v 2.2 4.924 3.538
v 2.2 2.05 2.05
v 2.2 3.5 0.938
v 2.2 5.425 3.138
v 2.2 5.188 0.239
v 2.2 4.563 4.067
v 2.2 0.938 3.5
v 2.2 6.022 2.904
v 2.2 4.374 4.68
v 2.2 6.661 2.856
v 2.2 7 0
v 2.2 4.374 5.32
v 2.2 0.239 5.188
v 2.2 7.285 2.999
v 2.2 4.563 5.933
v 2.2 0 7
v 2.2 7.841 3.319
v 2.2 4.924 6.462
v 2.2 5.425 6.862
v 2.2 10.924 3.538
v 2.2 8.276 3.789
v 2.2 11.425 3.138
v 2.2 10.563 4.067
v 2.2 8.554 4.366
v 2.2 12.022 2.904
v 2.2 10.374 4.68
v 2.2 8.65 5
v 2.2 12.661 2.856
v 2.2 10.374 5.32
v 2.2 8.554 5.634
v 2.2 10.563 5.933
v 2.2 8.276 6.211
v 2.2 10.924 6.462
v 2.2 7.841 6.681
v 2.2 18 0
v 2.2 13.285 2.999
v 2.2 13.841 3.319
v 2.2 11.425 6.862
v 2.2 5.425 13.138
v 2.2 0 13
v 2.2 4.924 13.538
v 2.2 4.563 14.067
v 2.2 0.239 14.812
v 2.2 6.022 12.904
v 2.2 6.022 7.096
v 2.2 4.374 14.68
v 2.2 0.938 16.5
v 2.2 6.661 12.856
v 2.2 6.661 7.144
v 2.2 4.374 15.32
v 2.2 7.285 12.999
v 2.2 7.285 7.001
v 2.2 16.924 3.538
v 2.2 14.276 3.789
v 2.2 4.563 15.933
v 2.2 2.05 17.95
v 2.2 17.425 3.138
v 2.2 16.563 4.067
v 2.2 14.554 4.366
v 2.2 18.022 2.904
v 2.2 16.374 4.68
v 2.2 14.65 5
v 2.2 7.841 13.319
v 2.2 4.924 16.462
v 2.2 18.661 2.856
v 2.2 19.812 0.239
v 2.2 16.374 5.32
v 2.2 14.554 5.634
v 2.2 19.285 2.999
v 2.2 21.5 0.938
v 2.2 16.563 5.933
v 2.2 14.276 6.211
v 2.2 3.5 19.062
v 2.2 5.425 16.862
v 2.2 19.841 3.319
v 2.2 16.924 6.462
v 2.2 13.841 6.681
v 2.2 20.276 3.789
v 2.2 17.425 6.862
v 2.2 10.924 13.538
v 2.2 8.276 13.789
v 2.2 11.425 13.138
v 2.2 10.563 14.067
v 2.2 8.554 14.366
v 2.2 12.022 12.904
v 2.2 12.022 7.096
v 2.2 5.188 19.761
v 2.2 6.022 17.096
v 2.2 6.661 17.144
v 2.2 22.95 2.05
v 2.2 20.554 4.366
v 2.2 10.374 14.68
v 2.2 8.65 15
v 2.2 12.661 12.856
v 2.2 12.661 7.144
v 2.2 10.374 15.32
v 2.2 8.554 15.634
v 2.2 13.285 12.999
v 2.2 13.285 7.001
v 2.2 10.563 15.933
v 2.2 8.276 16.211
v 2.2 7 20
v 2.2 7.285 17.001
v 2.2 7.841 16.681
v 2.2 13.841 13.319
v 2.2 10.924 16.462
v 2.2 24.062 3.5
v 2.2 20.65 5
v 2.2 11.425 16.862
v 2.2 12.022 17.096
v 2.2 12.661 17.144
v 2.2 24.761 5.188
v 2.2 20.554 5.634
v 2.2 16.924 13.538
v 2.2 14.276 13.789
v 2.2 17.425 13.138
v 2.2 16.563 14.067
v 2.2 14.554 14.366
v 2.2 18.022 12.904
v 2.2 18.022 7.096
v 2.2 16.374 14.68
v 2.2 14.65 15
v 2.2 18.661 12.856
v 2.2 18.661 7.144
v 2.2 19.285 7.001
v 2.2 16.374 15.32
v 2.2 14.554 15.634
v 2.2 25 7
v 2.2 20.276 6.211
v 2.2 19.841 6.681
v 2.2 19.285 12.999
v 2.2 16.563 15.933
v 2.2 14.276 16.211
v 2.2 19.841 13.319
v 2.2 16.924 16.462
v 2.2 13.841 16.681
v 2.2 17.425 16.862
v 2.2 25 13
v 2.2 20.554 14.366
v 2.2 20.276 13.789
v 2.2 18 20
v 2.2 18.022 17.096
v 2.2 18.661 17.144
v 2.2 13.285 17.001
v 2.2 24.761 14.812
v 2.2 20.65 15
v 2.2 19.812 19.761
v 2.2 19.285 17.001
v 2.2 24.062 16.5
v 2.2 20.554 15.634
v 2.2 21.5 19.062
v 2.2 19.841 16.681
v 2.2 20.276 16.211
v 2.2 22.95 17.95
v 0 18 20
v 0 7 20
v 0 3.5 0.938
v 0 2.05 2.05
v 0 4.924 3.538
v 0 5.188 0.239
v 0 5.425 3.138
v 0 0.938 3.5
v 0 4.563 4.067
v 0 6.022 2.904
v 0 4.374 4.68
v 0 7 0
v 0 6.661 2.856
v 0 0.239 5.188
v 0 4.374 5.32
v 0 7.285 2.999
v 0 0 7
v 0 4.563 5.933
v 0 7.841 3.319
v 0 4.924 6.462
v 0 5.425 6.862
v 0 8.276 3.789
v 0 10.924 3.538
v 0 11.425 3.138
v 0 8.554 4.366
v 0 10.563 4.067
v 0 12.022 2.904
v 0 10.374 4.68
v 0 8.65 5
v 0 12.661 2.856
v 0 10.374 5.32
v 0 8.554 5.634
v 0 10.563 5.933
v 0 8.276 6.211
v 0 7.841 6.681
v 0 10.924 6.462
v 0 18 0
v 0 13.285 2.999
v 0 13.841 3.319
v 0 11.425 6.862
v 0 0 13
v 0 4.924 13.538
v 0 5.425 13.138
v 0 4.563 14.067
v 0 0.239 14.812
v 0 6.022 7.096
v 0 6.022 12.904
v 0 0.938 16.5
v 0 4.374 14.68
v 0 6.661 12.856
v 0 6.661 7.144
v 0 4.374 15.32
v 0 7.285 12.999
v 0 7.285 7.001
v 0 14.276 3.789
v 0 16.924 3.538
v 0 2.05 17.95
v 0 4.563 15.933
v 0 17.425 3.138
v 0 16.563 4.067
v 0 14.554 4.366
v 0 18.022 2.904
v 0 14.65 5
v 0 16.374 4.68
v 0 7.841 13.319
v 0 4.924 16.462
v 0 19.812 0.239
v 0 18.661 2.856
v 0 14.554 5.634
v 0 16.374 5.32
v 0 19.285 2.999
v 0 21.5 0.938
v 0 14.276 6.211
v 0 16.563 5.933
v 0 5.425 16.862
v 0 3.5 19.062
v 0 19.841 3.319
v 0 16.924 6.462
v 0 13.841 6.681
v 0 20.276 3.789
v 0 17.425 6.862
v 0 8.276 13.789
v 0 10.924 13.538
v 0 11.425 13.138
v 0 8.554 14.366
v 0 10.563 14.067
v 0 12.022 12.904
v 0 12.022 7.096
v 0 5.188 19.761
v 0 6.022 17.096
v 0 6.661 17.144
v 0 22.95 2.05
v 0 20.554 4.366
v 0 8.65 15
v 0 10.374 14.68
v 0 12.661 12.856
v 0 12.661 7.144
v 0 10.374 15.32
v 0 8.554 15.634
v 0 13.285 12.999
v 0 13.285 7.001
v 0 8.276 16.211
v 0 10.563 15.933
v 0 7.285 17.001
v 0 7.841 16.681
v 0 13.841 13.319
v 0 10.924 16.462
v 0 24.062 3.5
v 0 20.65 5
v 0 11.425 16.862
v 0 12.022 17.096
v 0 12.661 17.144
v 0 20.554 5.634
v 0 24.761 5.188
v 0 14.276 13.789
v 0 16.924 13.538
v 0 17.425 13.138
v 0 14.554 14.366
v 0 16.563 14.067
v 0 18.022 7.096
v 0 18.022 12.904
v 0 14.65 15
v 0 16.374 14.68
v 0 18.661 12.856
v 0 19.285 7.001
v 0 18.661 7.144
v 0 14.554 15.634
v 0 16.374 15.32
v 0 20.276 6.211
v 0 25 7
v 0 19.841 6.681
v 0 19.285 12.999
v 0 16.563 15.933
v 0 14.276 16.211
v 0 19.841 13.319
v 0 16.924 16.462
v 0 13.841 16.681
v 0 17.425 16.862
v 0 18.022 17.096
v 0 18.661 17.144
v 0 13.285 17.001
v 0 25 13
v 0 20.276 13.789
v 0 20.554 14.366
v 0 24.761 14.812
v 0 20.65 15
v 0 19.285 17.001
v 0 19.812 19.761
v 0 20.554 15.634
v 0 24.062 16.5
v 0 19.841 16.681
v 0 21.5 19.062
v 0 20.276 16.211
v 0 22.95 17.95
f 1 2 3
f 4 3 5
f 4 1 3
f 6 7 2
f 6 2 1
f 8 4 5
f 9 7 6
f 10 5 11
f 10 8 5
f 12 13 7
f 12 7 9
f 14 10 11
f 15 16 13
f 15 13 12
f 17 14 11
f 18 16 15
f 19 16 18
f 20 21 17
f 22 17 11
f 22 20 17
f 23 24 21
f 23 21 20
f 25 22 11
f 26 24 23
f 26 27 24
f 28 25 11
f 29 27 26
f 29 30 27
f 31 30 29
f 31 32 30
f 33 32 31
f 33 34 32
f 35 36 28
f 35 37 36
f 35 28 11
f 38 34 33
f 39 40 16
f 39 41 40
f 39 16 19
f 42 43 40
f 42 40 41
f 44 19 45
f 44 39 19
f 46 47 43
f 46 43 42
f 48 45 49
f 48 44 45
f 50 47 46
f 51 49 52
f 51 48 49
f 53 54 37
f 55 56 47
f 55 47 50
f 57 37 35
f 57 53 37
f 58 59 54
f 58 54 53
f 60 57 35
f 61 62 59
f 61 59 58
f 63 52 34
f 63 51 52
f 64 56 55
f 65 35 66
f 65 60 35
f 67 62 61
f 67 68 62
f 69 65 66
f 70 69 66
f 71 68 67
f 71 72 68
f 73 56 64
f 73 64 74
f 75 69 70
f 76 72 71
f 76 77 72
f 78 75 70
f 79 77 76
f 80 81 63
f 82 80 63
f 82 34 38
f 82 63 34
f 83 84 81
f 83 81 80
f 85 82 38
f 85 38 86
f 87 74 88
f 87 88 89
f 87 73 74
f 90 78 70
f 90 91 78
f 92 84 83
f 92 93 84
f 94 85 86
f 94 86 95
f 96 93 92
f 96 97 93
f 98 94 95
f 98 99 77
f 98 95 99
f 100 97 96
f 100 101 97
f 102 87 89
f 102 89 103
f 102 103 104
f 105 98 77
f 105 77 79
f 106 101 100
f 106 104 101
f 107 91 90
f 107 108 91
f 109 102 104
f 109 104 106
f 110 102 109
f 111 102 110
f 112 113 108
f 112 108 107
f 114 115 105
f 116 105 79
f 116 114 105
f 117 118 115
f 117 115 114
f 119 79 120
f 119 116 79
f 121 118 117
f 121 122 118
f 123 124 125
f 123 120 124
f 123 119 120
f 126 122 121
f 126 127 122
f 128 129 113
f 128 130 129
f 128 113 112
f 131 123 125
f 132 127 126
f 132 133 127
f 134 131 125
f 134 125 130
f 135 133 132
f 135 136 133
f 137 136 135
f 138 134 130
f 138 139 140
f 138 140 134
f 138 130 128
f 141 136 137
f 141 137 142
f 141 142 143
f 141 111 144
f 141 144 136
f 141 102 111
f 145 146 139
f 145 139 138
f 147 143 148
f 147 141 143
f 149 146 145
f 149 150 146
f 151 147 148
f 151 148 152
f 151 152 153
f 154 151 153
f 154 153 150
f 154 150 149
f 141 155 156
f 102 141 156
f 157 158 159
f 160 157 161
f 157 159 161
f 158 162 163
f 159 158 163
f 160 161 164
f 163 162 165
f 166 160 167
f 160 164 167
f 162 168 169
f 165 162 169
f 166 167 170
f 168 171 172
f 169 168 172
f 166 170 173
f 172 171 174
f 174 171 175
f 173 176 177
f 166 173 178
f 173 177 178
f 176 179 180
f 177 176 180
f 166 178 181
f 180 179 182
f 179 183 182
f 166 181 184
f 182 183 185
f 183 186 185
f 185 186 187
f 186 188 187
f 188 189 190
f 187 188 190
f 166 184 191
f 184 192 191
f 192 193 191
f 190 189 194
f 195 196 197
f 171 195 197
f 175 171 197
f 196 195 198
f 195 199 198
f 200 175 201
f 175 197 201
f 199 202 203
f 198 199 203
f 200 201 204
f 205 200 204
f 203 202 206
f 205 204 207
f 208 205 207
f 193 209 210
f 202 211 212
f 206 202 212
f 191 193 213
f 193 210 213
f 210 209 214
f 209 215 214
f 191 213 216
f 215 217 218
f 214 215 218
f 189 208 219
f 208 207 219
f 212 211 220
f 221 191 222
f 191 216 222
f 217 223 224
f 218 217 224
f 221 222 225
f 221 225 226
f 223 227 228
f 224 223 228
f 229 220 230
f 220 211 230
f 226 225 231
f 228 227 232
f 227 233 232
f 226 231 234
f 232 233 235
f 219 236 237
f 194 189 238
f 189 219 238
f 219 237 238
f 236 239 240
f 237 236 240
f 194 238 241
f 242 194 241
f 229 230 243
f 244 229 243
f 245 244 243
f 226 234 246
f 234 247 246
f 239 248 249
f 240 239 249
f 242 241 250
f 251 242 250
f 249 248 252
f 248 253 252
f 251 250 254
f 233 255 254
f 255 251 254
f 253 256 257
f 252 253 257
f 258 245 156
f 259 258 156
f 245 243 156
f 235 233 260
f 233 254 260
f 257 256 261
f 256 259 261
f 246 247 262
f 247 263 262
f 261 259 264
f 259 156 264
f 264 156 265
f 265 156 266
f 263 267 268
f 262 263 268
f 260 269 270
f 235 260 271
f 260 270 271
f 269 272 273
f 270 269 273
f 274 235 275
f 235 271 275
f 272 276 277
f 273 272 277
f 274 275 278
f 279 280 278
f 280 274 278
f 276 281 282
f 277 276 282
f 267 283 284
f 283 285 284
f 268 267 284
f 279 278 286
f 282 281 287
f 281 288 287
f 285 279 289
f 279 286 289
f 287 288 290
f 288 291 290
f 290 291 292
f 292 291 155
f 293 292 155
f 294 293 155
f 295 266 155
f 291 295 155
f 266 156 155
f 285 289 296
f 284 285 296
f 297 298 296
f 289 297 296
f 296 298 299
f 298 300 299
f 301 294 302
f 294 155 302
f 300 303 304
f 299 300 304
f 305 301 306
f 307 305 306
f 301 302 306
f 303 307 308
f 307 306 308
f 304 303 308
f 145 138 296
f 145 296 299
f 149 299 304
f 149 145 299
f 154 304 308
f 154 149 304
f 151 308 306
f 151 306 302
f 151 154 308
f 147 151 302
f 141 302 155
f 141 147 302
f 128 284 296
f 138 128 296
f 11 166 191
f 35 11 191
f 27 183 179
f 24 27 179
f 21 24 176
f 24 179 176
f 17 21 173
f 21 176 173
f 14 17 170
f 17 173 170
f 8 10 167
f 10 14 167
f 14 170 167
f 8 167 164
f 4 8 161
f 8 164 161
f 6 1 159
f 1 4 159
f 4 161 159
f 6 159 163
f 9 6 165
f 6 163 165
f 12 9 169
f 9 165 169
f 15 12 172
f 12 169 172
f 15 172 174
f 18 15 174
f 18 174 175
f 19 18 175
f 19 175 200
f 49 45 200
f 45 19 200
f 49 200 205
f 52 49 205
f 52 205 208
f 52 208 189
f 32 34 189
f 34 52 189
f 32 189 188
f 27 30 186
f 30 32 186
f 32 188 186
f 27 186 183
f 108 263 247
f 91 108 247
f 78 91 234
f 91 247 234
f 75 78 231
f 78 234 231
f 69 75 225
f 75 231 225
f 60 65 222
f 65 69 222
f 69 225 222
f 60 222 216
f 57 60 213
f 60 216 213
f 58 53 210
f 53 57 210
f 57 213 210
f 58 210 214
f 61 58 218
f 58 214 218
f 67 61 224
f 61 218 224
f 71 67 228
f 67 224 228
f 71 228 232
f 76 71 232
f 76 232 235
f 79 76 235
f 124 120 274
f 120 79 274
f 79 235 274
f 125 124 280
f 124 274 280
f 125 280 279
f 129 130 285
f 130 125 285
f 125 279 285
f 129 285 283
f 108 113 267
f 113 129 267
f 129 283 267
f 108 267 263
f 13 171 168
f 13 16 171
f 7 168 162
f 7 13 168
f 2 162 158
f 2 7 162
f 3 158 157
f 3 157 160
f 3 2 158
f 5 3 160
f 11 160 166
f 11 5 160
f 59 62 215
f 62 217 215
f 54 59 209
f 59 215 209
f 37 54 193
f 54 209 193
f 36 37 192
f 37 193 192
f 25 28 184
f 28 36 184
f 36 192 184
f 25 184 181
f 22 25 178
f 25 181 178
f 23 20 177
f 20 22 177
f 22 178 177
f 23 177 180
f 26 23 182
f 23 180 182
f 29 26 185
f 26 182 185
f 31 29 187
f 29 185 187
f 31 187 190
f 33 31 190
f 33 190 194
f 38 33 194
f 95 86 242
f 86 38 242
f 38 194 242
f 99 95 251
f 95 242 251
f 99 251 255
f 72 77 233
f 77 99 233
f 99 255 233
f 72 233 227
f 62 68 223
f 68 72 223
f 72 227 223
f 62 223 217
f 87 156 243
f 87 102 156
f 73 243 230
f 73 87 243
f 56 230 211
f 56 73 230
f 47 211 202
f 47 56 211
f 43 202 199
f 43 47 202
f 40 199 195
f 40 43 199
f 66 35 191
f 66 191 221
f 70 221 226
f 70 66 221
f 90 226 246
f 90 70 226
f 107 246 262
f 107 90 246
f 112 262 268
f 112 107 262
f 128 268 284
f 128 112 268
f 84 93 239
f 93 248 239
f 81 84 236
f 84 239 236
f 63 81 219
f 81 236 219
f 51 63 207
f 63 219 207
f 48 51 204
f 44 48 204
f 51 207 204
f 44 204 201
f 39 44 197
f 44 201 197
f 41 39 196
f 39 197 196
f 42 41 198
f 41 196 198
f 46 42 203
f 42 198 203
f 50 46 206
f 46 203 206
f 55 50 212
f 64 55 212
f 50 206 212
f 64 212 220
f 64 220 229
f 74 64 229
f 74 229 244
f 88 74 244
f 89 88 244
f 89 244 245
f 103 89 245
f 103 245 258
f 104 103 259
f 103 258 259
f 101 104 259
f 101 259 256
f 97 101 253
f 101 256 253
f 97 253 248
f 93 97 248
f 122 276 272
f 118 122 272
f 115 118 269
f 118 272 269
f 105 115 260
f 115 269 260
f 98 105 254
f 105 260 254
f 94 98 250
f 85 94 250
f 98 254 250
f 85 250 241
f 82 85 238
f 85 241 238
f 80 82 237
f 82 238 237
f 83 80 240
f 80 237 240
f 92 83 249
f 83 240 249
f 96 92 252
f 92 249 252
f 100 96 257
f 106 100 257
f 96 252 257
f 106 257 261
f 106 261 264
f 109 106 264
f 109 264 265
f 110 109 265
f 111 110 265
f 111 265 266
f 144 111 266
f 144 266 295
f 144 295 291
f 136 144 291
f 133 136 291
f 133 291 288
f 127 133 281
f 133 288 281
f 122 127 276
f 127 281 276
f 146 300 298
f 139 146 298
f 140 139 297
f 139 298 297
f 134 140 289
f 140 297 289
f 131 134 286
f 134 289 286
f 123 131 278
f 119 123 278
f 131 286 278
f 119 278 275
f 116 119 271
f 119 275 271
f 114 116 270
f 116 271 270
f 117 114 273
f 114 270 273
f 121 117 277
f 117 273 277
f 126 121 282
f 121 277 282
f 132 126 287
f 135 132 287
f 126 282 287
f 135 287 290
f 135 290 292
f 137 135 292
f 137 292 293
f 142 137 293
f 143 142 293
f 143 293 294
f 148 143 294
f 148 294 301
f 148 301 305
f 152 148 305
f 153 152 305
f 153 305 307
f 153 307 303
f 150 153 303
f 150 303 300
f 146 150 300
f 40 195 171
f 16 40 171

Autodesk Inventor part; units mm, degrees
ref_plane "YZ Plane" through (0, 0, 0) normal (1, 0, 0) x (0, 1, 0)
ref_plane "XZ Plane" through (0, 0, 0) normal (0, 1, 0) x (-1, 0, 0)
ref_plane "XY Plane" through (0, 0, 0) normal (0, 0, 1) x (1, 0, 0)
sketch "Esquisse11" plane through (0, 0, 0) normal (1, 0, 0) x (0, 1, 0)
  line L0 (0, 0) -> (25, 0)
  line L1 (25, 0) -> (25, 10)
  line L2 (25, 10) -> (0, 10)
  line L3 (0, 10) -> (0, 0)
  line L4 (12.5, 0) -> (12.5, 10) construction
  circle A0 centre (12.5, 5) radius 2.15
  line L5 (12.5, 5) -> (25, 5) construction
  circle A1 centre (18.5, 5) radius 2.15
  circle A2 centre (6.5, 5) radius 2.15
  circle A3 centre (12.5, 5) radius 2.15
  dimension "d118" = 25
  dimension "d119" = 10
  dimension "d120" = 5
  dimension "d121" = 4.3
  dimension "d124" = 6
  dimension "d127" = 6
extrude "Extrusion11" add sketch "Esquisse11" along normal blind 2.2
fillet "Congé7" radius 7 2 edges at (1.1, 0, 0) (1.1, 25, 0)
mirror "Symétrie2" about plane through (0, 25, 10) normal (0, 0, 1)
equation "\"d121\" = Holes"
equation "\"d130\" = Depth"
equation "\"d132\" = Rounding"
equation "\"Depth\" = 2.2"
equation "\"Holes\" = 4.3"
equation "\"Height\" = 0"
equation "\"Rounding\" = 7"
properties part number "BottomToBottom"
